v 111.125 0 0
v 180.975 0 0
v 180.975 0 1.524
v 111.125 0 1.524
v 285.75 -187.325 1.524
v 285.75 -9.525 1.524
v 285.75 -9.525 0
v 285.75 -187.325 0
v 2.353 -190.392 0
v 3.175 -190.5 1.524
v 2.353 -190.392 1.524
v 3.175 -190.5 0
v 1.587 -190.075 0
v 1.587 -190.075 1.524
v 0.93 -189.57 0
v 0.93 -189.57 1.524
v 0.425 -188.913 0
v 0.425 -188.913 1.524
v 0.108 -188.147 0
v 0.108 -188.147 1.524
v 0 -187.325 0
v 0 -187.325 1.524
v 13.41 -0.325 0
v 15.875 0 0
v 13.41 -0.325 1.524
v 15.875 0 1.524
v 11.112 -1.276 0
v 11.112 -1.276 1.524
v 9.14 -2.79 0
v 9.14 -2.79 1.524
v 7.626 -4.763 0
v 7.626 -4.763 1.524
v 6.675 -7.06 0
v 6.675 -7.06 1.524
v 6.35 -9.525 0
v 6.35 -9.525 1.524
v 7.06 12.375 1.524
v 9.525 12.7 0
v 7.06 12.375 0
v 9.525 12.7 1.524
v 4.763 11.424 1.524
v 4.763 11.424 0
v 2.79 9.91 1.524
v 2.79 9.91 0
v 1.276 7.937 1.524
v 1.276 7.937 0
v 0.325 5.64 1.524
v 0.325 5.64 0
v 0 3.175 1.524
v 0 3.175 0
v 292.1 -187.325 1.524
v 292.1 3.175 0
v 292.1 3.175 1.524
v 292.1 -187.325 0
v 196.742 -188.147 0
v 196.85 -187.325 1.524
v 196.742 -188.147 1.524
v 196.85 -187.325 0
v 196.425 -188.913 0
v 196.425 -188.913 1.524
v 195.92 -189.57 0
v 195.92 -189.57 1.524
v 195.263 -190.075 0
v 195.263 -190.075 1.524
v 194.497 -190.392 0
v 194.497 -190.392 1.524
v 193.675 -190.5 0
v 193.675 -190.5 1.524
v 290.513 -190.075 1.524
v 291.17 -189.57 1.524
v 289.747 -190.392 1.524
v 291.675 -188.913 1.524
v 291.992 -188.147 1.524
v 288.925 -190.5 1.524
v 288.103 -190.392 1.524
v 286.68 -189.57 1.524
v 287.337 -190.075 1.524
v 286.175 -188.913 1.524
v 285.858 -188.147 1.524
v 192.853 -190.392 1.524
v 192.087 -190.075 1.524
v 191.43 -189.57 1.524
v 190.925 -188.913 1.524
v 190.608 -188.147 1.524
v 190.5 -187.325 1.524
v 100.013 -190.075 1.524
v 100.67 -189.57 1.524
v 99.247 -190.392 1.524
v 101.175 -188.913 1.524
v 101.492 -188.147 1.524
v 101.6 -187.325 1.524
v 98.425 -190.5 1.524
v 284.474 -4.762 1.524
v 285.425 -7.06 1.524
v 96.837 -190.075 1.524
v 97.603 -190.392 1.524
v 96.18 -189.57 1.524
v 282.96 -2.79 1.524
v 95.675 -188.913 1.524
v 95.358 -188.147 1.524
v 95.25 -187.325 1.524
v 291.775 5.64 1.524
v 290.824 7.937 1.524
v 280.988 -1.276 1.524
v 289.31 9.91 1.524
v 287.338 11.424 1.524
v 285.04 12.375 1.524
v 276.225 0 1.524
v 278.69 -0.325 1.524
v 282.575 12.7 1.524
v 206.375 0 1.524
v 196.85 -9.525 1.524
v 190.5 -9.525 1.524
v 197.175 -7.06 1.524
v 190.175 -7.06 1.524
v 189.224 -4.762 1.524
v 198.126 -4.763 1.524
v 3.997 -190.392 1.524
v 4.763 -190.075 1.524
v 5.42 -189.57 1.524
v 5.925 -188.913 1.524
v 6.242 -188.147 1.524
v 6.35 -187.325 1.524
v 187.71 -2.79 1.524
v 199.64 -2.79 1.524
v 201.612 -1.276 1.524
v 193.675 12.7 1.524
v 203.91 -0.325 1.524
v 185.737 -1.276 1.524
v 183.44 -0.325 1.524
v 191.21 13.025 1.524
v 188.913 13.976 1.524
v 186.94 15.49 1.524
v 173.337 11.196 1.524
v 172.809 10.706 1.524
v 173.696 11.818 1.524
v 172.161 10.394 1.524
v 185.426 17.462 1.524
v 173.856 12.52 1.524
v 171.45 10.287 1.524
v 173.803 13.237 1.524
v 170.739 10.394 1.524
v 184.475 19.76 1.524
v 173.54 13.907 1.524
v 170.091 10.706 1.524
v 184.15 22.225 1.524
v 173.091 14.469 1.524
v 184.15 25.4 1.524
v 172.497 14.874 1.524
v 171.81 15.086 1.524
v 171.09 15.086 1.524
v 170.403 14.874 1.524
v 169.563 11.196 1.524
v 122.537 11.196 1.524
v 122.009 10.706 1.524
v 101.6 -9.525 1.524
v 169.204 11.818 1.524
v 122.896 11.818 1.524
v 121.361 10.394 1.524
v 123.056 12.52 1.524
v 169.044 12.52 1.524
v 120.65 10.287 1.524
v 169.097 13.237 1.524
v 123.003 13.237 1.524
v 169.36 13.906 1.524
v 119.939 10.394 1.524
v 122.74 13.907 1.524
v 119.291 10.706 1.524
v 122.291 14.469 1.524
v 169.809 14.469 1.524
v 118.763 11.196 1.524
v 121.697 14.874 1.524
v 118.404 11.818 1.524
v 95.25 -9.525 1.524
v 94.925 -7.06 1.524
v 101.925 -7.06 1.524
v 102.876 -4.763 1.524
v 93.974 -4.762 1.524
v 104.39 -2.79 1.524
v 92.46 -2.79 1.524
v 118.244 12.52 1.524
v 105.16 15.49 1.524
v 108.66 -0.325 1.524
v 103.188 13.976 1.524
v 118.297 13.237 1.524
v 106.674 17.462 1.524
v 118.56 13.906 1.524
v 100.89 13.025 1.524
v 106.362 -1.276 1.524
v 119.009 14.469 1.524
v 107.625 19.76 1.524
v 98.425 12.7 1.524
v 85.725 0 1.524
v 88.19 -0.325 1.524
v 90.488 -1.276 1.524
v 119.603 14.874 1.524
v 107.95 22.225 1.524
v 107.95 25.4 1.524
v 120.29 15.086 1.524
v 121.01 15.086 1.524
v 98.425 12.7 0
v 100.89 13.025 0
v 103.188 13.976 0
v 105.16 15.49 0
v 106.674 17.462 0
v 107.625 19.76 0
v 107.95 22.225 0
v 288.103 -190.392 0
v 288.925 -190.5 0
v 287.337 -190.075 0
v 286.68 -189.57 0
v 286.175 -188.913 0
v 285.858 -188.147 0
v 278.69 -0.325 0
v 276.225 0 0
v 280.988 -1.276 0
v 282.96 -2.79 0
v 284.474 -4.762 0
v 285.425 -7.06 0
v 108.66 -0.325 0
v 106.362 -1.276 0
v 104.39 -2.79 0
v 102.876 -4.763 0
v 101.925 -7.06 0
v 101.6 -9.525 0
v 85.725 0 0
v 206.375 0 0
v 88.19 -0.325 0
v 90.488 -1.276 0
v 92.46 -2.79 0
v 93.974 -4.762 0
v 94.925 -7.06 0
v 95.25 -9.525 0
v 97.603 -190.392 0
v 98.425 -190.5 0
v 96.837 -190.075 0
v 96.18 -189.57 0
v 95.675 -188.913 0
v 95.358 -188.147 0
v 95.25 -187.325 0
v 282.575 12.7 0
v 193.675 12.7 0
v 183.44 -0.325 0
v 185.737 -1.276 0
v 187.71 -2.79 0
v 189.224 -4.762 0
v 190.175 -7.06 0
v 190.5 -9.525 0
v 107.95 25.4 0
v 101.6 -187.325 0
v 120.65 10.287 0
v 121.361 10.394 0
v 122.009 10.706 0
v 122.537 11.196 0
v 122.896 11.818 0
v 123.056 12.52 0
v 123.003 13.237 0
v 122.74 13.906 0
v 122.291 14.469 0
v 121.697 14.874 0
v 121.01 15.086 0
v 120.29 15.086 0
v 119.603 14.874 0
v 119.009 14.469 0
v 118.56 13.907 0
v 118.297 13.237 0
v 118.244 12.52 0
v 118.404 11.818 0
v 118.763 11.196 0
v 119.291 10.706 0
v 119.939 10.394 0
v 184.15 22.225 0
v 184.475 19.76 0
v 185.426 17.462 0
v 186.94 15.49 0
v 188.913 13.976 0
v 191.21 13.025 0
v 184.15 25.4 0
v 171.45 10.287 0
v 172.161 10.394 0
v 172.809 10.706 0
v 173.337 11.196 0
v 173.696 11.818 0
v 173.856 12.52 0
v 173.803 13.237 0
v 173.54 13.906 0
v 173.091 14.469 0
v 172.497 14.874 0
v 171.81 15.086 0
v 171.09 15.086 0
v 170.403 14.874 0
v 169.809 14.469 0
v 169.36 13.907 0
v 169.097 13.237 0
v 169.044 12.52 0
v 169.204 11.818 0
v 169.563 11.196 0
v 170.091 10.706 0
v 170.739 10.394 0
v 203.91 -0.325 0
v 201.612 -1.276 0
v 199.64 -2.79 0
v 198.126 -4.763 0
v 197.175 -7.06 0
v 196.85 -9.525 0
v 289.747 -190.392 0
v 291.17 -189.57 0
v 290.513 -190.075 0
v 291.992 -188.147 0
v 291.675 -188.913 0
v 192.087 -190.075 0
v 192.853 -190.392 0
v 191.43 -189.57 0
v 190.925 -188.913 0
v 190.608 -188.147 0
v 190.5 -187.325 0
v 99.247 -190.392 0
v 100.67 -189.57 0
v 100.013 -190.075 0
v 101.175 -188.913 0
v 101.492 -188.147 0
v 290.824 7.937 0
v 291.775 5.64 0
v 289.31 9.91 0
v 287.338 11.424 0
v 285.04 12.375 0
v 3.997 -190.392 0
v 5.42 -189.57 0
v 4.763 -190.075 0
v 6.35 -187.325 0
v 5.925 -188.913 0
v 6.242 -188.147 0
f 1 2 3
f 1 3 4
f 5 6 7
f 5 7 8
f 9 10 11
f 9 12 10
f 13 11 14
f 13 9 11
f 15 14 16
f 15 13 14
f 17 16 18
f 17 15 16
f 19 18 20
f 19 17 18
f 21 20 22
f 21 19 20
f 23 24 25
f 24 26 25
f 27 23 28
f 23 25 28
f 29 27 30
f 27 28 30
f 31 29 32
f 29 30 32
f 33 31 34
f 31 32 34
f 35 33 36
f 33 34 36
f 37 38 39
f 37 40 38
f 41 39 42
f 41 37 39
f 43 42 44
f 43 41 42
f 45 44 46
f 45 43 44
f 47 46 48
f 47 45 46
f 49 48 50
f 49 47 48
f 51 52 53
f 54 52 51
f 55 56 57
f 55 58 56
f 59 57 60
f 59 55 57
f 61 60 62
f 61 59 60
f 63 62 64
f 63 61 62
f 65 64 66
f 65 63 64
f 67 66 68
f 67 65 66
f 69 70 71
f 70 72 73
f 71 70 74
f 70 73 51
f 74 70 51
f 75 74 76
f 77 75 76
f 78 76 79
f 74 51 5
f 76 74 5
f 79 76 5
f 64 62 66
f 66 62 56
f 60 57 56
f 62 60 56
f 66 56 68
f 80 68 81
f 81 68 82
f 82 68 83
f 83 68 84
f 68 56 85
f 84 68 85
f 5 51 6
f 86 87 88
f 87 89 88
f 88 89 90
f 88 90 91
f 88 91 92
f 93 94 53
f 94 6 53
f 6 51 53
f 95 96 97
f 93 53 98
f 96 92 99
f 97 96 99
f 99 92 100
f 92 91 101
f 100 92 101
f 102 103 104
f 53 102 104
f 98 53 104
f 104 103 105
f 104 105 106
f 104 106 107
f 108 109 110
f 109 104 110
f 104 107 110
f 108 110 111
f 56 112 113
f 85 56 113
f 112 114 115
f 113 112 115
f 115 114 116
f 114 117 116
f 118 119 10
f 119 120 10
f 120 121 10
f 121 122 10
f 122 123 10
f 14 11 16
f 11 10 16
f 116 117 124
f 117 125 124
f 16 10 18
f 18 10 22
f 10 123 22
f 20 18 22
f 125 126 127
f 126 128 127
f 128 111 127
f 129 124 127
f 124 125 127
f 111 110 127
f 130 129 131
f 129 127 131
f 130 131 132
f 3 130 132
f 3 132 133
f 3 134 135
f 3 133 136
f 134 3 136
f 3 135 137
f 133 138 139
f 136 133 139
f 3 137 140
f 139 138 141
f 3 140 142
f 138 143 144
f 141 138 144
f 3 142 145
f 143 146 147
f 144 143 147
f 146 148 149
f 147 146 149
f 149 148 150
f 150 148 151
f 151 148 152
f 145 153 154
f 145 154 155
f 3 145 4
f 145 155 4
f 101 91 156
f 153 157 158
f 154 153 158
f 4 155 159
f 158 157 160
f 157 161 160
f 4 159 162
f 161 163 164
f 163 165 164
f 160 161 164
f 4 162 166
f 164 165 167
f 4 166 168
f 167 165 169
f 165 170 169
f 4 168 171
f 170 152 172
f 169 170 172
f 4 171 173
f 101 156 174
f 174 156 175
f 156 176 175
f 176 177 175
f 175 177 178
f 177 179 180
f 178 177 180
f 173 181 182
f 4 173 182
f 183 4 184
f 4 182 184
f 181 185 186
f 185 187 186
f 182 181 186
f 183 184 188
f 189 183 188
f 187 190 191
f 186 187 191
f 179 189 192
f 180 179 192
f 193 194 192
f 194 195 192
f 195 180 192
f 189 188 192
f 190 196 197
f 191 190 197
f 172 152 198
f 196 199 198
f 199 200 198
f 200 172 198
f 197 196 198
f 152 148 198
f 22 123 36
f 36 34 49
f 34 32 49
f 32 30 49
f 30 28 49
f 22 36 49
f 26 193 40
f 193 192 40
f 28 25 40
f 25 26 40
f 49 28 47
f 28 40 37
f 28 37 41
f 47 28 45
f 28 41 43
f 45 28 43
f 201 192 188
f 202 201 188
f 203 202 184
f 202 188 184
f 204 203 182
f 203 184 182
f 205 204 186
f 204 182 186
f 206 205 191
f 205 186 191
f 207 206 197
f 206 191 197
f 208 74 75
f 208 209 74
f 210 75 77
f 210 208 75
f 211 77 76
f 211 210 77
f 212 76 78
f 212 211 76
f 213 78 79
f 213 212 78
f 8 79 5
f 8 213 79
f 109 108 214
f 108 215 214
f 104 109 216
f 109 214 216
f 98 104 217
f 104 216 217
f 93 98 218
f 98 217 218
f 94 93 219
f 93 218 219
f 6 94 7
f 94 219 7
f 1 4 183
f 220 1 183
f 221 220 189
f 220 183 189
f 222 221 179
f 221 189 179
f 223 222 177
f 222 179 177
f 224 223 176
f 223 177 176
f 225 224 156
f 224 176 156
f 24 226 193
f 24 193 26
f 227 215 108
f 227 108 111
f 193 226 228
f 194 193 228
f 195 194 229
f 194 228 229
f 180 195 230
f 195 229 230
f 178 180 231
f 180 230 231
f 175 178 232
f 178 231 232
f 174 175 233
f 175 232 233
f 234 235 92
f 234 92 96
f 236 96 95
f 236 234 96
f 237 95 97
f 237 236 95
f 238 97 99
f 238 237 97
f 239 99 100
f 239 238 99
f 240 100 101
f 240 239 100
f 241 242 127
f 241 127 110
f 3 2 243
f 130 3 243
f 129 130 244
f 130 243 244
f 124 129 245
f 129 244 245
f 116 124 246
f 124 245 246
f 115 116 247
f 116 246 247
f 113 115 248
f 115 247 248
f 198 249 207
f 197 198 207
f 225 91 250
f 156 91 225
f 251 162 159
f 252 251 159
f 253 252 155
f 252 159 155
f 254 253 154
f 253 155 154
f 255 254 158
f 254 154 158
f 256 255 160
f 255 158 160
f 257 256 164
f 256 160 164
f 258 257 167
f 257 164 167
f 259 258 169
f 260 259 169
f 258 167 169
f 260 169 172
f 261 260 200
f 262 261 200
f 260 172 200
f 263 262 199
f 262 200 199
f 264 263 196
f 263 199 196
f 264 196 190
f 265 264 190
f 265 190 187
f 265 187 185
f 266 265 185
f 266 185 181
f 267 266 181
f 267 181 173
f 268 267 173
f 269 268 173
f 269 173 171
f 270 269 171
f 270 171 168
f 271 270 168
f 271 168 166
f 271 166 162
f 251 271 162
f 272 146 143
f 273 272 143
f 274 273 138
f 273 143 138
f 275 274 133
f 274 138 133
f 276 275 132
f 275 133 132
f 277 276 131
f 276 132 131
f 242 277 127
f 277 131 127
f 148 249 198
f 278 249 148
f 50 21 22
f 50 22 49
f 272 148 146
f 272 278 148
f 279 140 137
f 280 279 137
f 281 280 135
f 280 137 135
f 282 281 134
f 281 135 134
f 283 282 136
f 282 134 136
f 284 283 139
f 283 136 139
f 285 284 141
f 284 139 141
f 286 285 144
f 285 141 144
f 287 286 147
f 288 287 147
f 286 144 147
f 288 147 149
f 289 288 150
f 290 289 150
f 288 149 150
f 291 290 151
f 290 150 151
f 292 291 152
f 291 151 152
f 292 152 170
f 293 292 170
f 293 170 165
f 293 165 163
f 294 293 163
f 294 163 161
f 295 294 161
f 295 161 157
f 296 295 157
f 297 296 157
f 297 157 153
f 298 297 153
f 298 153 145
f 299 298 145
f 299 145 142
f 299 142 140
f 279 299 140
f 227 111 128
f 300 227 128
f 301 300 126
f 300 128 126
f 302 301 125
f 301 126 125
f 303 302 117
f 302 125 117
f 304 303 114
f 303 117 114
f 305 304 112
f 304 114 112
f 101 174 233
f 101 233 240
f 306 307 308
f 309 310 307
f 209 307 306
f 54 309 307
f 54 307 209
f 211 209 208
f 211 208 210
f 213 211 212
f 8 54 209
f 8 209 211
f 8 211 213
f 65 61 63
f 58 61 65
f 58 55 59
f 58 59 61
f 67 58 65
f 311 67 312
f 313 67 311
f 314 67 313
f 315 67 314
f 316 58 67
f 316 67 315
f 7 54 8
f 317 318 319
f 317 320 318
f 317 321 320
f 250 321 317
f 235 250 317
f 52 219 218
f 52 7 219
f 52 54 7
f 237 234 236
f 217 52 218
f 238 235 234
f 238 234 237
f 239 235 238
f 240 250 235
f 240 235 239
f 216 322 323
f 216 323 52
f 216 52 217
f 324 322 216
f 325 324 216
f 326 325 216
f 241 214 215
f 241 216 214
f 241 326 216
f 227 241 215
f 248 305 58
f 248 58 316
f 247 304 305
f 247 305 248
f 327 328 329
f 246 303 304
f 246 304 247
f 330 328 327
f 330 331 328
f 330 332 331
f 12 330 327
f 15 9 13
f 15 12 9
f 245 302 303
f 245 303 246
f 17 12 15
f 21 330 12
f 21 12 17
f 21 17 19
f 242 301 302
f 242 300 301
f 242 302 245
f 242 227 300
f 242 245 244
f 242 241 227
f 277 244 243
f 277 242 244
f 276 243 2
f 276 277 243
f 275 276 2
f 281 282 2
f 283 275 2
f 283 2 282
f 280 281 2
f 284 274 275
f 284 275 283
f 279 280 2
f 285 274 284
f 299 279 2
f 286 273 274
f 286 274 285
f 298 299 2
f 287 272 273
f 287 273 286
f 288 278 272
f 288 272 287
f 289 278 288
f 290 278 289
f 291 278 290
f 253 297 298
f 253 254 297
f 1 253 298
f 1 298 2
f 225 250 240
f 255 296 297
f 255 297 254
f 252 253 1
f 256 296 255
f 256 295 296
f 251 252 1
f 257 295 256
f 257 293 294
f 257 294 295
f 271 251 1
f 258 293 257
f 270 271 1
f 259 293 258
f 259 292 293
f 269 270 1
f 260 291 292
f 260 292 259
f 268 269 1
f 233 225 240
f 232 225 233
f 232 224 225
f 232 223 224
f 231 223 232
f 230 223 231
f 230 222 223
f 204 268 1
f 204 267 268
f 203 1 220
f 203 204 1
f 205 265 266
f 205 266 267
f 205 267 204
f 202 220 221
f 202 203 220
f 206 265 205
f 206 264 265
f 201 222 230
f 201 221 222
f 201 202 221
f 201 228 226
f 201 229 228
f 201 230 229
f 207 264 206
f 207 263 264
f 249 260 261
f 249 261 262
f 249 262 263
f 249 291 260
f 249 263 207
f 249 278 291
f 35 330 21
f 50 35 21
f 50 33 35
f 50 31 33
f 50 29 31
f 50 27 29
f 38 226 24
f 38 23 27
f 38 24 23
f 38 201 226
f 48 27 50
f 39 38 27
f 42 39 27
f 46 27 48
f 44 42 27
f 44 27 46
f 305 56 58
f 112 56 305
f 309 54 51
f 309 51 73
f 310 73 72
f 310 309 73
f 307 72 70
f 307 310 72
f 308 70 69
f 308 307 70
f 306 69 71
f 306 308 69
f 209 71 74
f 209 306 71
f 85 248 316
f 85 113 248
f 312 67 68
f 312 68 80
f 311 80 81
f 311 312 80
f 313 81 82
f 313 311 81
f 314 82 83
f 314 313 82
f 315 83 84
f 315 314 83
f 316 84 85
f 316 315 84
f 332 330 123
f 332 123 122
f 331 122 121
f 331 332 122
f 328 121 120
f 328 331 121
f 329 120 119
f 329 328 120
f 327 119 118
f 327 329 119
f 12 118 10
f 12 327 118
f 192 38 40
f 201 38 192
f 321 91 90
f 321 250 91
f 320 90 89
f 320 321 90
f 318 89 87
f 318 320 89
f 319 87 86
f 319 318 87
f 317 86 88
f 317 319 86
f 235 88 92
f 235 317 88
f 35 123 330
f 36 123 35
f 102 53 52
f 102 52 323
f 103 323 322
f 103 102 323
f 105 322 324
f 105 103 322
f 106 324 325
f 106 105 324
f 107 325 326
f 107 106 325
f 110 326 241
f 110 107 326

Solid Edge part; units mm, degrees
sketch "Sketch1" plane through (0, 0, 0) normal (0, 0, 1) x (1, 0, 0)
  line L0 (0, 0) -> (0, 12.7)
  line L1 (0, 12.7) -> (107.95, 12.7)
  line L2 (107.95, 25.4) -> (107.95, 12.7)
  line L3 (107.95, 25.4) -> (184.15, 25.4)
  line L4 (184.15, 25.4) -> (184.15, 12.7)
  line L5 (184.15, 12.7) -> (292.1, 12.7)
  line L6 (292.1, 12.7) -> (292.1, 0)
  line L7 (292.1, 0) -> (0, 0)
  dimension "D1" = 292.1
  dimension "D2" = 12.7
  dimension "D3" = 38.1
  dimension "D4" = 76.2
  dimension "D5" = 12.7
extrude "Protrusion1" add sketch "Sketch1" along normal blind 1.524
sketch "Sketch2" plane through (146.05, 12.7, 1.524) normal (0, 0, 1) x (1, 0, 0)
  line L0 (-146.05, 0) -> (-146.05, -203.2)
  line L1 (-146.05, -203.2) -> (-139.7, -203.2)
  line L2 (-139.7, -203.2) -> (-139.7, 0)
  line L3 (-139.7, 0) -> (-146.05, 0)
  dimension "D1" = 203.2
  dimension "D2" = 6.35
extrude "Protrusion_2" add sketch "Sketch2" against normal blind 1.524
pattern_linear "Pattern1" count 4 spacing 95.25 along (1, 0, 0) of "Protrusion_2"
fillet "Round_1" radius 9.525 10 edges at (0, 12.7, 0.762) (6.35, 0, 0.762) (95.25, 0, 0.762) (101.6, 0, 0.762) (107.95, 12.7, 0.762) (184.15, 12.7, 0.762) (190.5, 0, 0.762) (196.85, 0, 0.762) (285.75, 0, 0.762) (292.1, 12.7, 0.762)
fillet "Round_2" radius 3.175 8 edges at (0, -190.5, 0.762) (6.35, -190.5, 0.762) (95.25, -190.5, 0.762) (101.6, -190.5, 0.762) (190.5, -190.5, 0.762) (196.85, -190.5, 0.762) (285.75, -190.5, 0.762) (292.1, -190.5, 0.762)
hole "Hole_1" at (171.45, 12.7, 1.524) direction (0, 0, -1) diameter 4.826 end up to next
hole "Hole1" at (120.65, 12.7, 1.524) direction (0, 0, -1) diameter 4.826 end up to next
